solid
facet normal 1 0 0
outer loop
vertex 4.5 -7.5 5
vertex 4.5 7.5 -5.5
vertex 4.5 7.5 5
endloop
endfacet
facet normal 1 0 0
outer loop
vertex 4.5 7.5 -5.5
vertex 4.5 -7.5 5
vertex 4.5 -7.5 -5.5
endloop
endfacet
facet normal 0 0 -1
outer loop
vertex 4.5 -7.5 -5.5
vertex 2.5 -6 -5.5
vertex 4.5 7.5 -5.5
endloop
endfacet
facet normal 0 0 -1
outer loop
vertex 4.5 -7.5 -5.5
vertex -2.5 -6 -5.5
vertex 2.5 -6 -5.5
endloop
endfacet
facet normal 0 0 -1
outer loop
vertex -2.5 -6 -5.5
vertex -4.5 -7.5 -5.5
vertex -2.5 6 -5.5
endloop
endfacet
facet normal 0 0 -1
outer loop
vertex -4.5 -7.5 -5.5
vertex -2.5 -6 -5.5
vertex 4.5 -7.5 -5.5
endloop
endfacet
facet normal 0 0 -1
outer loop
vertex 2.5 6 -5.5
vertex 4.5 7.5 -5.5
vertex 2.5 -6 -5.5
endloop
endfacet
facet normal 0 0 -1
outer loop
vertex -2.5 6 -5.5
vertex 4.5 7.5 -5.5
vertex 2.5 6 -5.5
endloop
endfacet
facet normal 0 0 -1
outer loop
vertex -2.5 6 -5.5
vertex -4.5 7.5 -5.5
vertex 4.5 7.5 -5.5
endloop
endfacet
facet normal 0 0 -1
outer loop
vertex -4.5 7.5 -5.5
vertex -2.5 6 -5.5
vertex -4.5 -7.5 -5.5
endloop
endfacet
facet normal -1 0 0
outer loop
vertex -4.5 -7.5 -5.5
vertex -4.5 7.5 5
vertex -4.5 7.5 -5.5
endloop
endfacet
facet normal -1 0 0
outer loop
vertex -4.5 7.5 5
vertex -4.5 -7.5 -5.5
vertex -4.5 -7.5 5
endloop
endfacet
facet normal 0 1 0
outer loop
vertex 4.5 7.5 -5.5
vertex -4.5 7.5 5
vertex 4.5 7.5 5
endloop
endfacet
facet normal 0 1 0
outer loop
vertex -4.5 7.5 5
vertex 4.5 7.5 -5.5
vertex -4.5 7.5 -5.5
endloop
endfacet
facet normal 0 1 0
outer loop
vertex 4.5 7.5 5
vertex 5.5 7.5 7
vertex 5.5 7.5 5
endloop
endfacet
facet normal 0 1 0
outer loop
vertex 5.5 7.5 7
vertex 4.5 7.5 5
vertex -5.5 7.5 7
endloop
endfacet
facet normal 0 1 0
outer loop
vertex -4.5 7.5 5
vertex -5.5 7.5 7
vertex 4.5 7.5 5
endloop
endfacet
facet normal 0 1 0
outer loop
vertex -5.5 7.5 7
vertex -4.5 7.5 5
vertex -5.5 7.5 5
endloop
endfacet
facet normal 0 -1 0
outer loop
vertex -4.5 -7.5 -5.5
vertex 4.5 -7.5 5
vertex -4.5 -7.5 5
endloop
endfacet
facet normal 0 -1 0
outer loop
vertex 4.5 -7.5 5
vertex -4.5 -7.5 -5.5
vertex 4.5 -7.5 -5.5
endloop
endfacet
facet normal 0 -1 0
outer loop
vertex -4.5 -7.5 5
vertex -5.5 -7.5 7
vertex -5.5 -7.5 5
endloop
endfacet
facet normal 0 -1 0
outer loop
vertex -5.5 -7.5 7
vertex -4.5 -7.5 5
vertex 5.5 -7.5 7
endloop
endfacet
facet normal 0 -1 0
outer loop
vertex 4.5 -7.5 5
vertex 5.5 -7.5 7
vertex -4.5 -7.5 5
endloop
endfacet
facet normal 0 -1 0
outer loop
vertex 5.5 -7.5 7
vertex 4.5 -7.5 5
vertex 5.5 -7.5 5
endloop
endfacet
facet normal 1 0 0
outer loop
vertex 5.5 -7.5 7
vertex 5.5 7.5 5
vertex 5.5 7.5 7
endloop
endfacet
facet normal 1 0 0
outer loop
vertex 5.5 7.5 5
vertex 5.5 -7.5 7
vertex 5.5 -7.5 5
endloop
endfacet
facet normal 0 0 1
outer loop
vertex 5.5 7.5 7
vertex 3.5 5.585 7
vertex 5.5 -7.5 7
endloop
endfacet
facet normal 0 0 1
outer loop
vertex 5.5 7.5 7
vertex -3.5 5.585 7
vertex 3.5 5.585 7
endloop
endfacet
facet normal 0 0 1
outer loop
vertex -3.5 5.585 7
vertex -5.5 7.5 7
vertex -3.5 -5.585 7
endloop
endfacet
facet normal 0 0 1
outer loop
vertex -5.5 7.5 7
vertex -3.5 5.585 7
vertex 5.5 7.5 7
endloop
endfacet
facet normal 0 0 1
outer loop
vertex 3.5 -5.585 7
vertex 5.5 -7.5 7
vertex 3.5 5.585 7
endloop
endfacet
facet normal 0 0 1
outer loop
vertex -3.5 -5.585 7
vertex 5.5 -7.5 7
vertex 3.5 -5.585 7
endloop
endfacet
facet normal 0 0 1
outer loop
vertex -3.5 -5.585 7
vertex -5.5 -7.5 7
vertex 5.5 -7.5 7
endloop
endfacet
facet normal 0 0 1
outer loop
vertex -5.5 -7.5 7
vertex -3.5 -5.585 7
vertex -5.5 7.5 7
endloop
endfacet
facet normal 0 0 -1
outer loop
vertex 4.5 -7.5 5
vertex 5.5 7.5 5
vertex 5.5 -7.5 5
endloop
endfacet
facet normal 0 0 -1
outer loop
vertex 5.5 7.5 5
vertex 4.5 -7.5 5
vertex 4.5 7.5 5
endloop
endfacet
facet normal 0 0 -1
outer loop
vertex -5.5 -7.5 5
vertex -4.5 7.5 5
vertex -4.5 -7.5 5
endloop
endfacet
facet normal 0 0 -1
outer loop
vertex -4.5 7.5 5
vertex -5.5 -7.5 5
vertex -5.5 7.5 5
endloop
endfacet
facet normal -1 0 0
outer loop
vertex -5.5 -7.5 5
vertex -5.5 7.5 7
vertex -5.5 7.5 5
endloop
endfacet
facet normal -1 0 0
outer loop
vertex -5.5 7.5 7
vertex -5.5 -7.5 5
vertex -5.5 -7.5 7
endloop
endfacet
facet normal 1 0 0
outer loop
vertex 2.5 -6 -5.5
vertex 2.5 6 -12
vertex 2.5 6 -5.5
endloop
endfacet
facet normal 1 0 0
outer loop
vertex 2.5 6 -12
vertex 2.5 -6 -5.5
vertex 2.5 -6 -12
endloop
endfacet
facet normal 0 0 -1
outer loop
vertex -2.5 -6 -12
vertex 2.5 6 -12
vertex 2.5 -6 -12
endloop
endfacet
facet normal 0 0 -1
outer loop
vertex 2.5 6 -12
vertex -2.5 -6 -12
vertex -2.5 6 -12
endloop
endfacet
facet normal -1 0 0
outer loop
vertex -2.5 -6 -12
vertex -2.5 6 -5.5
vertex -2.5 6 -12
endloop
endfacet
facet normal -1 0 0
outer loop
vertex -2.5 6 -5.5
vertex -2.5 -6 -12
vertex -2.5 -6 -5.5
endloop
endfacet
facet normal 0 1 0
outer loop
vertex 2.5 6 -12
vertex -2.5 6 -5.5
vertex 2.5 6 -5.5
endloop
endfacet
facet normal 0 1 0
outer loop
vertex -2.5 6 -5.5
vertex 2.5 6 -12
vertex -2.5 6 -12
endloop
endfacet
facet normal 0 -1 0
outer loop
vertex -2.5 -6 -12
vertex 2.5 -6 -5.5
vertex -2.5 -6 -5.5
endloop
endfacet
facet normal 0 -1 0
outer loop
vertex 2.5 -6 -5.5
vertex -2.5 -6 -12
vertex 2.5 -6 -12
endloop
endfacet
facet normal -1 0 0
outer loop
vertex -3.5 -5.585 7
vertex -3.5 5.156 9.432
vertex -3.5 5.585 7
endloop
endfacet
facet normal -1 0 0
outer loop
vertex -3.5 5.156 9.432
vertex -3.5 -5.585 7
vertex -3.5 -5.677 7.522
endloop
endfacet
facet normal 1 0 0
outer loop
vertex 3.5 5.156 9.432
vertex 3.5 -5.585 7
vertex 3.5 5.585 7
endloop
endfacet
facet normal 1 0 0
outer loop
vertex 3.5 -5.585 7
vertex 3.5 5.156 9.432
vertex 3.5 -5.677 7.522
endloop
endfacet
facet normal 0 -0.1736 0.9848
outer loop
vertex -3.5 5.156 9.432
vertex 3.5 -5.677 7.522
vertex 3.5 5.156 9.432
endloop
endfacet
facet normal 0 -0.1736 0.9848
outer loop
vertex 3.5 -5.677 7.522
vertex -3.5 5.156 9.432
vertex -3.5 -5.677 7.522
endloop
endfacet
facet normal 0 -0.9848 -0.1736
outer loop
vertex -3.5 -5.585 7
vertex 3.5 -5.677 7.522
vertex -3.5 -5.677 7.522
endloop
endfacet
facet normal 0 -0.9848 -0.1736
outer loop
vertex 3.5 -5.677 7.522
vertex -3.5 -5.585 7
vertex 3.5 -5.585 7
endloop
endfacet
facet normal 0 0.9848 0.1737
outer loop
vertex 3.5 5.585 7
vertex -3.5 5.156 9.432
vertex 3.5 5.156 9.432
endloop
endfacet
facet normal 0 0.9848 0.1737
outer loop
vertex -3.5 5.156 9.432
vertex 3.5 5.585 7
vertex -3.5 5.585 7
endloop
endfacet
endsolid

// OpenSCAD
// NAME: 12V Power Switch 9x15
// CATEGORY: Electric
// COLOR: 0

module switch(){
    color([0.2, 0.2, 0.2])
        cube([9, 15, 11], center=true);
    translate([0, 0, 6])
        color([0.2, 0.2, 0.2])
        cube([11, 15, 2], center=true);
    translate([0, 0, -8.5])
        color([0.2, 0.2, 0.2, 0.5])
        cube([5, 12, 7], center=true);
    translate([0, 0, 7])
        rotate([10, 0, 0])
        color([0, 0.8, 0])
        cube([7, 11, 3], center=true);
}

switch();
